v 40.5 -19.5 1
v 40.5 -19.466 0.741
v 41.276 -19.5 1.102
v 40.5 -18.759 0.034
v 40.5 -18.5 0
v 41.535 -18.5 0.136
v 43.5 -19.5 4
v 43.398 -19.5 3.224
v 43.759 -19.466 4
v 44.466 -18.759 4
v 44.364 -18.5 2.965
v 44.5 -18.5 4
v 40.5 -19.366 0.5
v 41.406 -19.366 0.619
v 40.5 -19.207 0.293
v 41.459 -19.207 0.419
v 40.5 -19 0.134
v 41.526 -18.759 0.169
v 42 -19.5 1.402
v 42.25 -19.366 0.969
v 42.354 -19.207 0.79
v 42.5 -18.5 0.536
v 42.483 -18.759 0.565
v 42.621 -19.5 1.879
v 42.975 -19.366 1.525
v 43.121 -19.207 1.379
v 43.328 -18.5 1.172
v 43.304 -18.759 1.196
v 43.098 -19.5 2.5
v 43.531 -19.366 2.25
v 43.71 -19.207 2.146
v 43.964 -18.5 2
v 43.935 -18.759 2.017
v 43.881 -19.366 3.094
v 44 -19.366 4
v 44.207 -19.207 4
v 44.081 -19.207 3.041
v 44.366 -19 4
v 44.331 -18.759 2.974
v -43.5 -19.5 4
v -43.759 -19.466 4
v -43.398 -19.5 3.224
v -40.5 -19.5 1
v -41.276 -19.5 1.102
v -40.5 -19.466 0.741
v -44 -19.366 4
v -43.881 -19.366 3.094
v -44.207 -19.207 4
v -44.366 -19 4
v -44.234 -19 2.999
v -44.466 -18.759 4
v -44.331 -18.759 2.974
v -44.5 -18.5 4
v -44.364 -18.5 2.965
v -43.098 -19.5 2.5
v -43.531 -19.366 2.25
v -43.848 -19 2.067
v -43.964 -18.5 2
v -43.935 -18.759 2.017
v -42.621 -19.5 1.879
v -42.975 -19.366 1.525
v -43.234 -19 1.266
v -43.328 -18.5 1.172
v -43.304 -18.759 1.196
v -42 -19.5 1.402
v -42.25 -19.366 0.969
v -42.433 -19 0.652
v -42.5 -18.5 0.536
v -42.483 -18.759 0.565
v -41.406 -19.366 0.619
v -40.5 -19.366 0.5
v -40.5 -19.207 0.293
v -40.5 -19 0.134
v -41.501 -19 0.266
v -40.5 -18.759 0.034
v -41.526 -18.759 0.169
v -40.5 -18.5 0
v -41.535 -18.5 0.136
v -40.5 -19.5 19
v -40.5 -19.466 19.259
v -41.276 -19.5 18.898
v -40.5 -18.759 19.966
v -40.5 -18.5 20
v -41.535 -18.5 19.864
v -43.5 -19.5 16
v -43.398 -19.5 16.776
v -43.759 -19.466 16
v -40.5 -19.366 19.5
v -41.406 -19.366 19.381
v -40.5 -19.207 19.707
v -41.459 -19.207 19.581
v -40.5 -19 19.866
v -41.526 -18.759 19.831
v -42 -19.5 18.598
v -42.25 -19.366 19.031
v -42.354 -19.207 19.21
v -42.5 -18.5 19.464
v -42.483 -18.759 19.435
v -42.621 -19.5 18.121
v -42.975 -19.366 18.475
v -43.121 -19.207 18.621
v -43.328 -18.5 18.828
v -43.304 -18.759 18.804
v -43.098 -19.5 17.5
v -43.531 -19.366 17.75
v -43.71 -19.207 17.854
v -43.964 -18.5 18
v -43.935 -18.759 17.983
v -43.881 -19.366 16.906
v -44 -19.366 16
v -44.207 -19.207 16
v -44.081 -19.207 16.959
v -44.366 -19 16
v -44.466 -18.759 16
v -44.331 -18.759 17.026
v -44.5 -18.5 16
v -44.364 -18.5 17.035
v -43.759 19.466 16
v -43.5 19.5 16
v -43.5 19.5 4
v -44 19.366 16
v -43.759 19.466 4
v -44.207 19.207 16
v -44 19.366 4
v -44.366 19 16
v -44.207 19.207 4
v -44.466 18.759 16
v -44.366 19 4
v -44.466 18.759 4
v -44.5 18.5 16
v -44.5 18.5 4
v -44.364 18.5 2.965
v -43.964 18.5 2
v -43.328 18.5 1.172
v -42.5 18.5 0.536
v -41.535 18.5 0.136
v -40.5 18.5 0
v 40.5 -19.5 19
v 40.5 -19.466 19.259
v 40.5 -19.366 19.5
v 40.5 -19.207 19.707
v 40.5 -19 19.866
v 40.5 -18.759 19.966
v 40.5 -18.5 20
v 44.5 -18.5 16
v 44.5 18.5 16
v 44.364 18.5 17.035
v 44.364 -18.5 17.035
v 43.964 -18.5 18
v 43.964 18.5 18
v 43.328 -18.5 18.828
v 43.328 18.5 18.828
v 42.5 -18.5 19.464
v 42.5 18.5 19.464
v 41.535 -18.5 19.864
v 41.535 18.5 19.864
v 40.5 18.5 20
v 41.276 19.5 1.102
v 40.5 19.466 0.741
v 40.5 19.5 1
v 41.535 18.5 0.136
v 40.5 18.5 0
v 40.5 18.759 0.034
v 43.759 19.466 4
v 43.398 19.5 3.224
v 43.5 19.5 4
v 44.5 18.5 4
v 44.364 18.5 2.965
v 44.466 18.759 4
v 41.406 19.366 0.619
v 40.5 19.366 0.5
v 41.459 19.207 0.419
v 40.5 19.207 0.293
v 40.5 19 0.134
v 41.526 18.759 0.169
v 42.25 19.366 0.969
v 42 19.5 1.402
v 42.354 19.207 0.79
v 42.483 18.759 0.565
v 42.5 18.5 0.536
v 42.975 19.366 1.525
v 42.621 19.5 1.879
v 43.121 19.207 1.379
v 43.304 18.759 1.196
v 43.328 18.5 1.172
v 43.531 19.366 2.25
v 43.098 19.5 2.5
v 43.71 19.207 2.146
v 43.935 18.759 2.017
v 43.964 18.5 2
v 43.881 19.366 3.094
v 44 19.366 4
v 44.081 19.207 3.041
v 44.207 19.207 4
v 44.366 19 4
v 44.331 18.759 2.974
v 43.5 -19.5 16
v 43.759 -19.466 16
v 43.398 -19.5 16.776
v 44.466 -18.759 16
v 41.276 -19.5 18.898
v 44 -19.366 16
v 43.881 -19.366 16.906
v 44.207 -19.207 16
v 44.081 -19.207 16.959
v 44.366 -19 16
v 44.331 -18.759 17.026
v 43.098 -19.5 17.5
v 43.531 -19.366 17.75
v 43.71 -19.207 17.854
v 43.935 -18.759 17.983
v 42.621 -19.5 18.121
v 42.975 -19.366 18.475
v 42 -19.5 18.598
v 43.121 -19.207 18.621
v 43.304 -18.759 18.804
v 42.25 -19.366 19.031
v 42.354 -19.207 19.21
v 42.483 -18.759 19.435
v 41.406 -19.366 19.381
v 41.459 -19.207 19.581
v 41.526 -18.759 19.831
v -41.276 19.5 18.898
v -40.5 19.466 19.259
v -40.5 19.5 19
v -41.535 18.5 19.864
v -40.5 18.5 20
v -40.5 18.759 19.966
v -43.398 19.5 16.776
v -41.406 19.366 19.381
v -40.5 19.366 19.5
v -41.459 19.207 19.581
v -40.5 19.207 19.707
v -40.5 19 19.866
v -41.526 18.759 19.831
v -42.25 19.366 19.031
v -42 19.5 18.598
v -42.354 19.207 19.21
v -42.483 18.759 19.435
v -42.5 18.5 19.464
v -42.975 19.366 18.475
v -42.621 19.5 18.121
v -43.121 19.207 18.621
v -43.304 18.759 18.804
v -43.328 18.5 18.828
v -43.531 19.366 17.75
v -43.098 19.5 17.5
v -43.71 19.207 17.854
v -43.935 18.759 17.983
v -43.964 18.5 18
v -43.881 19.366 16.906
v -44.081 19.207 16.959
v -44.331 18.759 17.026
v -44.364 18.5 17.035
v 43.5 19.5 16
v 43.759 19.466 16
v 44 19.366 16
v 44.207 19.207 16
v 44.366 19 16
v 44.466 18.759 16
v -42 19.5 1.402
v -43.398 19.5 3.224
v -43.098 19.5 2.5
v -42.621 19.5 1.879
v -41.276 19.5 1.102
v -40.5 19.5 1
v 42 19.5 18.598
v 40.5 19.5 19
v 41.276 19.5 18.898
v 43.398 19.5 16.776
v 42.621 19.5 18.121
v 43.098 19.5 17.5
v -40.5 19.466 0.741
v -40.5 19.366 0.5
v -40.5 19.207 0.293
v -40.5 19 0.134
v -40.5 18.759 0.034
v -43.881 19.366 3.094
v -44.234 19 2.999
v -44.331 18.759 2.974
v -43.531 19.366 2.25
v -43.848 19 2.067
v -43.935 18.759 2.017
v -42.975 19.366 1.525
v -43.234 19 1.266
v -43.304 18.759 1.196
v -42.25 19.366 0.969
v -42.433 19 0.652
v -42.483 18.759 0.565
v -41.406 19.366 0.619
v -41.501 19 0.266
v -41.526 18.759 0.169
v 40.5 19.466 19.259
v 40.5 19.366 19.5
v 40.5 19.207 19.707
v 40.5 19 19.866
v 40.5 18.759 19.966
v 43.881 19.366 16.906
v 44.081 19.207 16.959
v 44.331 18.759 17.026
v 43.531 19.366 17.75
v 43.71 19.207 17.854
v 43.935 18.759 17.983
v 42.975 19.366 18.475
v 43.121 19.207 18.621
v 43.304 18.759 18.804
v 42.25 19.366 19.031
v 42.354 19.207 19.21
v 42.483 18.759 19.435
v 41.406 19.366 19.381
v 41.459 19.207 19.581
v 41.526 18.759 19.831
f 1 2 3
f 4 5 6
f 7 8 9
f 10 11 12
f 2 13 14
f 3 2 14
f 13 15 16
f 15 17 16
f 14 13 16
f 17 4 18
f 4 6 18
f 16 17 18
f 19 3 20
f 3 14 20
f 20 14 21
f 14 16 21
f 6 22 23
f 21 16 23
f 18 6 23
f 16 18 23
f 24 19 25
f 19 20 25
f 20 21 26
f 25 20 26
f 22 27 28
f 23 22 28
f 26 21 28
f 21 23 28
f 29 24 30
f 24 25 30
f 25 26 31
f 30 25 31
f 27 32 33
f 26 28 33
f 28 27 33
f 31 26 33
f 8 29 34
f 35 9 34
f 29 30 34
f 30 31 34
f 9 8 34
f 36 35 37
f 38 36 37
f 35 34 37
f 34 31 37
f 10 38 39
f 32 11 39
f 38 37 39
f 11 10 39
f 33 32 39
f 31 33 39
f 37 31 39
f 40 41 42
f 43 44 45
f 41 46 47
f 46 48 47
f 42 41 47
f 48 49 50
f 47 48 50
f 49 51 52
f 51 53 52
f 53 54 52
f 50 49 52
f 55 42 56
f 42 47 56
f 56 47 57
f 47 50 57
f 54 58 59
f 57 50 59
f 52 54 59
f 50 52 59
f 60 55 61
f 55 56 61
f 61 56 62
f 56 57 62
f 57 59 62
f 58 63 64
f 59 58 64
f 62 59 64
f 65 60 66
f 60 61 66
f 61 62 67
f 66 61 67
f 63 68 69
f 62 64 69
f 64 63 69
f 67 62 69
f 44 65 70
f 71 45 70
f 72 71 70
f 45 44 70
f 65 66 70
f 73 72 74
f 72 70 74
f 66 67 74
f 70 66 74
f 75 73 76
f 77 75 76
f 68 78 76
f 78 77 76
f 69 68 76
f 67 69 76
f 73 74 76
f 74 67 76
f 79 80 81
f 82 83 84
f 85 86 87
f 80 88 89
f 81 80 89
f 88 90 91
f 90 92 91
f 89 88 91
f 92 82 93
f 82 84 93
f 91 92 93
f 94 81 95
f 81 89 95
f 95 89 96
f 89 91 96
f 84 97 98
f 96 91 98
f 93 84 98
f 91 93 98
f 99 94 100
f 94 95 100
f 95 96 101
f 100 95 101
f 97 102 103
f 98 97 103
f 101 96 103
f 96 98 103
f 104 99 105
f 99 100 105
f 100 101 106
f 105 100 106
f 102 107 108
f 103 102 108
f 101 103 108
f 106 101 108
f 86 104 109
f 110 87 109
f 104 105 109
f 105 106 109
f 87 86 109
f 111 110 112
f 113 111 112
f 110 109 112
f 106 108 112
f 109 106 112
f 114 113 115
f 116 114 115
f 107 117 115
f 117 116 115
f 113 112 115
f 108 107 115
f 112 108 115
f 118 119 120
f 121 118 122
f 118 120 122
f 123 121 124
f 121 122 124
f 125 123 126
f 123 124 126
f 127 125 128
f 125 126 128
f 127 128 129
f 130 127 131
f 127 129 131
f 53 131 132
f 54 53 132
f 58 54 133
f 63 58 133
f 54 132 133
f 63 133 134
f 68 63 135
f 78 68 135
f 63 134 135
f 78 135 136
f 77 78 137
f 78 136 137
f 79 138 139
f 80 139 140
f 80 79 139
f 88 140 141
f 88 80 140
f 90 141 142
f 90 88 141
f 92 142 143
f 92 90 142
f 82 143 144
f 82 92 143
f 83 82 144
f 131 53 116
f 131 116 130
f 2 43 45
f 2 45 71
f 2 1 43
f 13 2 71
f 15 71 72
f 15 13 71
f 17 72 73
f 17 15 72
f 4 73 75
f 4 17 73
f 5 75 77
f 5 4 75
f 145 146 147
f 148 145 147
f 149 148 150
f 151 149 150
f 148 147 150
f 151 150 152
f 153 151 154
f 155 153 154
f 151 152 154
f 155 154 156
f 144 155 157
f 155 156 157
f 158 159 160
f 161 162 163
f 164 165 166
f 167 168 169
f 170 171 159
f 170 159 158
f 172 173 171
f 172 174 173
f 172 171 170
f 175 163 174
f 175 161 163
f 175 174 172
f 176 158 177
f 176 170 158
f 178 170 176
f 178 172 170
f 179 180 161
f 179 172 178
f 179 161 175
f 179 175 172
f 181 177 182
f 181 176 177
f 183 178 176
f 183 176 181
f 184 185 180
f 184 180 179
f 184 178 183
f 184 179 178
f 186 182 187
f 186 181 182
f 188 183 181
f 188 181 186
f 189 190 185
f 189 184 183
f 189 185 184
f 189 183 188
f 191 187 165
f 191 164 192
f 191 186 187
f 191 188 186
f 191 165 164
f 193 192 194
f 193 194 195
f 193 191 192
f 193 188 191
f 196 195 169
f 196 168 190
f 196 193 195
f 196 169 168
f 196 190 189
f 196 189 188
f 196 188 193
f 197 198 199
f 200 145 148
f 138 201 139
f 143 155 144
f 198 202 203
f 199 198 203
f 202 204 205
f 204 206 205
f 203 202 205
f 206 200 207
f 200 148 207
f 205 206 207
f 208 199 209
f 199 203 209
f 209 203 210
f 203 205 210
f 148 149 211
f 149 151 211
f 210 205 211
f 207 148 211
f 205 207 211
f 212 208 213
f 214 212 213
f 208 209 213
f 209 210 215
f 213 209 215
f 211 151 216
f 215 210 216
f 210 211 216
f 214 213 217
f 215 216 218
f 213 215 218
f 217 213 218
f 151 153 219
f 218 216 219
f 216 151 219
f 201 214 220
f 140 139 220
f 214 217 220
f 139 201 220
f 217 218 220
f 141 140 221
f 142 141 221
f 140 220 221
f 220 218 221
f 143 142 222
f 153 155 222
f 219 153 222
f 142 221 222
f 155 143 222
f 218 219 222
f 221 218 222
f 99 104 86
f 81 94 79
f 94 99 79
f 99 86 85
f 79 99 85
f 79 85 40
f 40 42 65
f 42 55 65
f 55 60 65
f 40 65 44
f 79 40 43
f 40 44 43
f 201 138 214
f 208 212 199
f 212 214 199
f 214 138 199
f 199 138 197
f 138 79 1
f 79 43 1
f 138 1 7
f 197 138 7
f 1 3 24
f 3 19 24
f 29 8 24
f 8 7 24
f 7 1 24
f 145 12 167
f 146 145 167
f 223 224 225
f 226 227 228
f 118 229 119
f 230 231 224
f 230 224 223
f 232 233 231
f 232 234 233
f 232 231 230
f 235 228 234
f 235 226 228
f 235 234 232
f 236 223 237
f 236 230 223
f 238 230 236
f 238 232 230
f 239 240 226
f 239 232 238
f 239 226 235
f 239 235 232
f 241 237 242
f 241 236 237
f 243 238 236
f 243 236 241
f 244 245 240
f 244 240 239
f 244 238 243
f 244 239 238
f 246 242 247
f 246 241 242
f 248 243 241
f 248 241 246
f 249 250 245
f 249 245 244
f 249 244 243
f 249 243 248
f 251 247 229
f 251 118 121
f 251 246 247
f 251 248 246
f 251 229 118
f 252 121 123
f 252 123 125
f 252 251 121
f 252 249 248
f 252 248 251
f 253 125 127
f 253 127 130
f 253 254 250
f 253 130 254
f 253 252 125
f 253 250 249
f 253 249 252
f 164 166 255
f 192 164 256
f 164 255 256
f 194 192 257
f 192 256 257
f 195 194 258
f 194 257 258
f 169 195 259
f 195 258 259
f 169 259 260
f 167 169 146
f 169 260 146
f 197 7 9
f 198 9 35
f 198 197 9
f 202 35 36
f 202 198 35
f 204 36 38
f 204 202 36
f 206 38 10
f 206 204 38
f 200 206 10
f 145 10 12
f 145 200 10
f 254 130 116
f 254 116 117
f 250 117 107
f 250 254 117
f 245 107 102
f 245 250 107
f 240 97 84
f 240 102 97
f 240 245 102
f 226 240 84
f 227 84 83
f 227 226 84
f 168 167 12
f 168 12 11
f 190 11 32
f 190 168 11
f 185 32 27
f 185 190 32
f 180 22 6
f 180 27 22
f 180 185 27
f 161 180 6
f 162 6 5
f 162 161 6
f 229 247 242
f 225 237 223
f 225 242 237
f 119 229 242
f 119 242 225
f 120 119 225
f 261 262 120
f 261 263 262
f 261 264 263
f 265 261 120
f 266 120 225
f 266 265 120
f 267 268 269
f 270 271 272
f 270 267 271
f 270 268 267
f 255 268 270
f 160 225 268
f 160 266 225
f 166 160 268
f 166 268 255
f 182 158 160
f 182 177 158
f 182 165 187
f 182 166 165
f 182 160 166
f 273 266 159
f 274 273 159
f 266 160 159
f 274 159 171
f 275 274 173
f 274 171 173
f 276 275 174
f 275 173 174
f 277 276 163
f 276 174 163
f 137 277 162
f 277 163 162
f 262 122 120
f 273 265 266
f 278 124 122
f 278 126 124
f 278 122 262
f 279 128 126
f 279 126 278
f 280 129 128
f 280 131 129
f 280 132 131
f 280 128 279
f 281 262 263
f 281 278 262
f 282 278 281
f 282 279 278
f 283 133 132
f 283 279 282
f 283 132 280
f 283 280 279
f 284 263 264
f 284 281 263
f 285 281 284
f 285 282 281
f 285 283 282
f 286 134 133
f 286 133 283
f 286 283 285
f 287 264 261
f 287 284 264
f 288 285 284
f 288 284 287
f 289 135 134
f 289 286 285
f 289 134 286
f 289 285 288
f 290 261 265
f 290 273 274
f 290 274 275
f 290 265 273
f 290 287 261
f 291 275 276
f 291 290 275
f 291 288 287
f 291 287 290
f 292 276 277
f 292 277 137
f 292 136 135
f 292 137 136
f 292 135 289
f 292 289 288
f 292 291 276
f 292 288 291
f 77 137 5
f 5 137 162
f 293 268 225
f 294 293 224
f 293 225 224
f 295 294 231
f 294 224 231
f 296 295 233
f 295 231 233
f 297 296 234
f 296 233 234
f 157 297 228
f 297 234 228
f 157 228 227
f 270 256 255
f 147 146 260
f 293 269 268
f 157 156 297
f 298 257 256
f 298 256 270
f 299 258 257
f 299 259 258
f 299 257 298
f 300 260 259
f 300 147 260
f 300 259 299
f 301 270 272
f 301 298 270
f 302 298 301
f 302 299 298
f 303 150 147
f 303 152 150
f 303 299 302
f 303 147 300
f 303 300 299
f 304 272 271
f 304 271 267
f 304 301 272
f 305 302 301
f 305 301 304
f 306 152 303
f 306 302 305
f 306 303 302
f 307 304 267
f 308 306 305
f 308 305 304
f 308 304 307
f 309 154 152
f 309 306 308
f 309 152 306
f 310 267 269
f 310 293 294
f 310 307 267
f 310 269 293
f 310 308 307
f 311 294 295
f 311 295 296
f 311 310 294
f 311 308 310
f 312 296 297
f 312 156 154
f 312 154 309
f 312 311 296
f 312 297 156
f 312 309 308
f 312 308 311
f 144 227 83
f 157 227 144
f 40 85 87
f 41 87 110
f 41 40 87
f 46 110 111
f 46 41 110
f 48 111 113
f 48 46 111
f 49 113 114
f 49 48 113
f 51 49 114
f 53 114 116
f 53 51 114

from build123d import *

# Parameters (mm, degrees)
F0_W     = 89
F0_H     = 39
F1_DEPTH = 20
F2_R     = 4
F3_R     = 1


with BuildPart() as f1:
    # F0 (on Top) → F1 (new body)
    with BuildSketch(Plane.XY):
        Rectangle(F0_W, F0_H)
    extrude(amount=F1_DEPTH)

    # F2
    f2_edges = [f1.edges().sort_by_distance(p)[0] for p in [
        (44.5, 0, 20),
        (44.5, 0, 0),
        (-44.5, 0, 20),
        (-44.5, 0, 0),
    ]]
    fillet(f2_edges, radius=F2_R)

    # F3
    f3_edges = [f1.edges().sort_by_distance(p)[0] for p in [
        (0, -19.5, 0),
        (0, 19.5, 0),
    ]]
    fillet(f3_edges, radius=F3_R)


solid = f1.part
